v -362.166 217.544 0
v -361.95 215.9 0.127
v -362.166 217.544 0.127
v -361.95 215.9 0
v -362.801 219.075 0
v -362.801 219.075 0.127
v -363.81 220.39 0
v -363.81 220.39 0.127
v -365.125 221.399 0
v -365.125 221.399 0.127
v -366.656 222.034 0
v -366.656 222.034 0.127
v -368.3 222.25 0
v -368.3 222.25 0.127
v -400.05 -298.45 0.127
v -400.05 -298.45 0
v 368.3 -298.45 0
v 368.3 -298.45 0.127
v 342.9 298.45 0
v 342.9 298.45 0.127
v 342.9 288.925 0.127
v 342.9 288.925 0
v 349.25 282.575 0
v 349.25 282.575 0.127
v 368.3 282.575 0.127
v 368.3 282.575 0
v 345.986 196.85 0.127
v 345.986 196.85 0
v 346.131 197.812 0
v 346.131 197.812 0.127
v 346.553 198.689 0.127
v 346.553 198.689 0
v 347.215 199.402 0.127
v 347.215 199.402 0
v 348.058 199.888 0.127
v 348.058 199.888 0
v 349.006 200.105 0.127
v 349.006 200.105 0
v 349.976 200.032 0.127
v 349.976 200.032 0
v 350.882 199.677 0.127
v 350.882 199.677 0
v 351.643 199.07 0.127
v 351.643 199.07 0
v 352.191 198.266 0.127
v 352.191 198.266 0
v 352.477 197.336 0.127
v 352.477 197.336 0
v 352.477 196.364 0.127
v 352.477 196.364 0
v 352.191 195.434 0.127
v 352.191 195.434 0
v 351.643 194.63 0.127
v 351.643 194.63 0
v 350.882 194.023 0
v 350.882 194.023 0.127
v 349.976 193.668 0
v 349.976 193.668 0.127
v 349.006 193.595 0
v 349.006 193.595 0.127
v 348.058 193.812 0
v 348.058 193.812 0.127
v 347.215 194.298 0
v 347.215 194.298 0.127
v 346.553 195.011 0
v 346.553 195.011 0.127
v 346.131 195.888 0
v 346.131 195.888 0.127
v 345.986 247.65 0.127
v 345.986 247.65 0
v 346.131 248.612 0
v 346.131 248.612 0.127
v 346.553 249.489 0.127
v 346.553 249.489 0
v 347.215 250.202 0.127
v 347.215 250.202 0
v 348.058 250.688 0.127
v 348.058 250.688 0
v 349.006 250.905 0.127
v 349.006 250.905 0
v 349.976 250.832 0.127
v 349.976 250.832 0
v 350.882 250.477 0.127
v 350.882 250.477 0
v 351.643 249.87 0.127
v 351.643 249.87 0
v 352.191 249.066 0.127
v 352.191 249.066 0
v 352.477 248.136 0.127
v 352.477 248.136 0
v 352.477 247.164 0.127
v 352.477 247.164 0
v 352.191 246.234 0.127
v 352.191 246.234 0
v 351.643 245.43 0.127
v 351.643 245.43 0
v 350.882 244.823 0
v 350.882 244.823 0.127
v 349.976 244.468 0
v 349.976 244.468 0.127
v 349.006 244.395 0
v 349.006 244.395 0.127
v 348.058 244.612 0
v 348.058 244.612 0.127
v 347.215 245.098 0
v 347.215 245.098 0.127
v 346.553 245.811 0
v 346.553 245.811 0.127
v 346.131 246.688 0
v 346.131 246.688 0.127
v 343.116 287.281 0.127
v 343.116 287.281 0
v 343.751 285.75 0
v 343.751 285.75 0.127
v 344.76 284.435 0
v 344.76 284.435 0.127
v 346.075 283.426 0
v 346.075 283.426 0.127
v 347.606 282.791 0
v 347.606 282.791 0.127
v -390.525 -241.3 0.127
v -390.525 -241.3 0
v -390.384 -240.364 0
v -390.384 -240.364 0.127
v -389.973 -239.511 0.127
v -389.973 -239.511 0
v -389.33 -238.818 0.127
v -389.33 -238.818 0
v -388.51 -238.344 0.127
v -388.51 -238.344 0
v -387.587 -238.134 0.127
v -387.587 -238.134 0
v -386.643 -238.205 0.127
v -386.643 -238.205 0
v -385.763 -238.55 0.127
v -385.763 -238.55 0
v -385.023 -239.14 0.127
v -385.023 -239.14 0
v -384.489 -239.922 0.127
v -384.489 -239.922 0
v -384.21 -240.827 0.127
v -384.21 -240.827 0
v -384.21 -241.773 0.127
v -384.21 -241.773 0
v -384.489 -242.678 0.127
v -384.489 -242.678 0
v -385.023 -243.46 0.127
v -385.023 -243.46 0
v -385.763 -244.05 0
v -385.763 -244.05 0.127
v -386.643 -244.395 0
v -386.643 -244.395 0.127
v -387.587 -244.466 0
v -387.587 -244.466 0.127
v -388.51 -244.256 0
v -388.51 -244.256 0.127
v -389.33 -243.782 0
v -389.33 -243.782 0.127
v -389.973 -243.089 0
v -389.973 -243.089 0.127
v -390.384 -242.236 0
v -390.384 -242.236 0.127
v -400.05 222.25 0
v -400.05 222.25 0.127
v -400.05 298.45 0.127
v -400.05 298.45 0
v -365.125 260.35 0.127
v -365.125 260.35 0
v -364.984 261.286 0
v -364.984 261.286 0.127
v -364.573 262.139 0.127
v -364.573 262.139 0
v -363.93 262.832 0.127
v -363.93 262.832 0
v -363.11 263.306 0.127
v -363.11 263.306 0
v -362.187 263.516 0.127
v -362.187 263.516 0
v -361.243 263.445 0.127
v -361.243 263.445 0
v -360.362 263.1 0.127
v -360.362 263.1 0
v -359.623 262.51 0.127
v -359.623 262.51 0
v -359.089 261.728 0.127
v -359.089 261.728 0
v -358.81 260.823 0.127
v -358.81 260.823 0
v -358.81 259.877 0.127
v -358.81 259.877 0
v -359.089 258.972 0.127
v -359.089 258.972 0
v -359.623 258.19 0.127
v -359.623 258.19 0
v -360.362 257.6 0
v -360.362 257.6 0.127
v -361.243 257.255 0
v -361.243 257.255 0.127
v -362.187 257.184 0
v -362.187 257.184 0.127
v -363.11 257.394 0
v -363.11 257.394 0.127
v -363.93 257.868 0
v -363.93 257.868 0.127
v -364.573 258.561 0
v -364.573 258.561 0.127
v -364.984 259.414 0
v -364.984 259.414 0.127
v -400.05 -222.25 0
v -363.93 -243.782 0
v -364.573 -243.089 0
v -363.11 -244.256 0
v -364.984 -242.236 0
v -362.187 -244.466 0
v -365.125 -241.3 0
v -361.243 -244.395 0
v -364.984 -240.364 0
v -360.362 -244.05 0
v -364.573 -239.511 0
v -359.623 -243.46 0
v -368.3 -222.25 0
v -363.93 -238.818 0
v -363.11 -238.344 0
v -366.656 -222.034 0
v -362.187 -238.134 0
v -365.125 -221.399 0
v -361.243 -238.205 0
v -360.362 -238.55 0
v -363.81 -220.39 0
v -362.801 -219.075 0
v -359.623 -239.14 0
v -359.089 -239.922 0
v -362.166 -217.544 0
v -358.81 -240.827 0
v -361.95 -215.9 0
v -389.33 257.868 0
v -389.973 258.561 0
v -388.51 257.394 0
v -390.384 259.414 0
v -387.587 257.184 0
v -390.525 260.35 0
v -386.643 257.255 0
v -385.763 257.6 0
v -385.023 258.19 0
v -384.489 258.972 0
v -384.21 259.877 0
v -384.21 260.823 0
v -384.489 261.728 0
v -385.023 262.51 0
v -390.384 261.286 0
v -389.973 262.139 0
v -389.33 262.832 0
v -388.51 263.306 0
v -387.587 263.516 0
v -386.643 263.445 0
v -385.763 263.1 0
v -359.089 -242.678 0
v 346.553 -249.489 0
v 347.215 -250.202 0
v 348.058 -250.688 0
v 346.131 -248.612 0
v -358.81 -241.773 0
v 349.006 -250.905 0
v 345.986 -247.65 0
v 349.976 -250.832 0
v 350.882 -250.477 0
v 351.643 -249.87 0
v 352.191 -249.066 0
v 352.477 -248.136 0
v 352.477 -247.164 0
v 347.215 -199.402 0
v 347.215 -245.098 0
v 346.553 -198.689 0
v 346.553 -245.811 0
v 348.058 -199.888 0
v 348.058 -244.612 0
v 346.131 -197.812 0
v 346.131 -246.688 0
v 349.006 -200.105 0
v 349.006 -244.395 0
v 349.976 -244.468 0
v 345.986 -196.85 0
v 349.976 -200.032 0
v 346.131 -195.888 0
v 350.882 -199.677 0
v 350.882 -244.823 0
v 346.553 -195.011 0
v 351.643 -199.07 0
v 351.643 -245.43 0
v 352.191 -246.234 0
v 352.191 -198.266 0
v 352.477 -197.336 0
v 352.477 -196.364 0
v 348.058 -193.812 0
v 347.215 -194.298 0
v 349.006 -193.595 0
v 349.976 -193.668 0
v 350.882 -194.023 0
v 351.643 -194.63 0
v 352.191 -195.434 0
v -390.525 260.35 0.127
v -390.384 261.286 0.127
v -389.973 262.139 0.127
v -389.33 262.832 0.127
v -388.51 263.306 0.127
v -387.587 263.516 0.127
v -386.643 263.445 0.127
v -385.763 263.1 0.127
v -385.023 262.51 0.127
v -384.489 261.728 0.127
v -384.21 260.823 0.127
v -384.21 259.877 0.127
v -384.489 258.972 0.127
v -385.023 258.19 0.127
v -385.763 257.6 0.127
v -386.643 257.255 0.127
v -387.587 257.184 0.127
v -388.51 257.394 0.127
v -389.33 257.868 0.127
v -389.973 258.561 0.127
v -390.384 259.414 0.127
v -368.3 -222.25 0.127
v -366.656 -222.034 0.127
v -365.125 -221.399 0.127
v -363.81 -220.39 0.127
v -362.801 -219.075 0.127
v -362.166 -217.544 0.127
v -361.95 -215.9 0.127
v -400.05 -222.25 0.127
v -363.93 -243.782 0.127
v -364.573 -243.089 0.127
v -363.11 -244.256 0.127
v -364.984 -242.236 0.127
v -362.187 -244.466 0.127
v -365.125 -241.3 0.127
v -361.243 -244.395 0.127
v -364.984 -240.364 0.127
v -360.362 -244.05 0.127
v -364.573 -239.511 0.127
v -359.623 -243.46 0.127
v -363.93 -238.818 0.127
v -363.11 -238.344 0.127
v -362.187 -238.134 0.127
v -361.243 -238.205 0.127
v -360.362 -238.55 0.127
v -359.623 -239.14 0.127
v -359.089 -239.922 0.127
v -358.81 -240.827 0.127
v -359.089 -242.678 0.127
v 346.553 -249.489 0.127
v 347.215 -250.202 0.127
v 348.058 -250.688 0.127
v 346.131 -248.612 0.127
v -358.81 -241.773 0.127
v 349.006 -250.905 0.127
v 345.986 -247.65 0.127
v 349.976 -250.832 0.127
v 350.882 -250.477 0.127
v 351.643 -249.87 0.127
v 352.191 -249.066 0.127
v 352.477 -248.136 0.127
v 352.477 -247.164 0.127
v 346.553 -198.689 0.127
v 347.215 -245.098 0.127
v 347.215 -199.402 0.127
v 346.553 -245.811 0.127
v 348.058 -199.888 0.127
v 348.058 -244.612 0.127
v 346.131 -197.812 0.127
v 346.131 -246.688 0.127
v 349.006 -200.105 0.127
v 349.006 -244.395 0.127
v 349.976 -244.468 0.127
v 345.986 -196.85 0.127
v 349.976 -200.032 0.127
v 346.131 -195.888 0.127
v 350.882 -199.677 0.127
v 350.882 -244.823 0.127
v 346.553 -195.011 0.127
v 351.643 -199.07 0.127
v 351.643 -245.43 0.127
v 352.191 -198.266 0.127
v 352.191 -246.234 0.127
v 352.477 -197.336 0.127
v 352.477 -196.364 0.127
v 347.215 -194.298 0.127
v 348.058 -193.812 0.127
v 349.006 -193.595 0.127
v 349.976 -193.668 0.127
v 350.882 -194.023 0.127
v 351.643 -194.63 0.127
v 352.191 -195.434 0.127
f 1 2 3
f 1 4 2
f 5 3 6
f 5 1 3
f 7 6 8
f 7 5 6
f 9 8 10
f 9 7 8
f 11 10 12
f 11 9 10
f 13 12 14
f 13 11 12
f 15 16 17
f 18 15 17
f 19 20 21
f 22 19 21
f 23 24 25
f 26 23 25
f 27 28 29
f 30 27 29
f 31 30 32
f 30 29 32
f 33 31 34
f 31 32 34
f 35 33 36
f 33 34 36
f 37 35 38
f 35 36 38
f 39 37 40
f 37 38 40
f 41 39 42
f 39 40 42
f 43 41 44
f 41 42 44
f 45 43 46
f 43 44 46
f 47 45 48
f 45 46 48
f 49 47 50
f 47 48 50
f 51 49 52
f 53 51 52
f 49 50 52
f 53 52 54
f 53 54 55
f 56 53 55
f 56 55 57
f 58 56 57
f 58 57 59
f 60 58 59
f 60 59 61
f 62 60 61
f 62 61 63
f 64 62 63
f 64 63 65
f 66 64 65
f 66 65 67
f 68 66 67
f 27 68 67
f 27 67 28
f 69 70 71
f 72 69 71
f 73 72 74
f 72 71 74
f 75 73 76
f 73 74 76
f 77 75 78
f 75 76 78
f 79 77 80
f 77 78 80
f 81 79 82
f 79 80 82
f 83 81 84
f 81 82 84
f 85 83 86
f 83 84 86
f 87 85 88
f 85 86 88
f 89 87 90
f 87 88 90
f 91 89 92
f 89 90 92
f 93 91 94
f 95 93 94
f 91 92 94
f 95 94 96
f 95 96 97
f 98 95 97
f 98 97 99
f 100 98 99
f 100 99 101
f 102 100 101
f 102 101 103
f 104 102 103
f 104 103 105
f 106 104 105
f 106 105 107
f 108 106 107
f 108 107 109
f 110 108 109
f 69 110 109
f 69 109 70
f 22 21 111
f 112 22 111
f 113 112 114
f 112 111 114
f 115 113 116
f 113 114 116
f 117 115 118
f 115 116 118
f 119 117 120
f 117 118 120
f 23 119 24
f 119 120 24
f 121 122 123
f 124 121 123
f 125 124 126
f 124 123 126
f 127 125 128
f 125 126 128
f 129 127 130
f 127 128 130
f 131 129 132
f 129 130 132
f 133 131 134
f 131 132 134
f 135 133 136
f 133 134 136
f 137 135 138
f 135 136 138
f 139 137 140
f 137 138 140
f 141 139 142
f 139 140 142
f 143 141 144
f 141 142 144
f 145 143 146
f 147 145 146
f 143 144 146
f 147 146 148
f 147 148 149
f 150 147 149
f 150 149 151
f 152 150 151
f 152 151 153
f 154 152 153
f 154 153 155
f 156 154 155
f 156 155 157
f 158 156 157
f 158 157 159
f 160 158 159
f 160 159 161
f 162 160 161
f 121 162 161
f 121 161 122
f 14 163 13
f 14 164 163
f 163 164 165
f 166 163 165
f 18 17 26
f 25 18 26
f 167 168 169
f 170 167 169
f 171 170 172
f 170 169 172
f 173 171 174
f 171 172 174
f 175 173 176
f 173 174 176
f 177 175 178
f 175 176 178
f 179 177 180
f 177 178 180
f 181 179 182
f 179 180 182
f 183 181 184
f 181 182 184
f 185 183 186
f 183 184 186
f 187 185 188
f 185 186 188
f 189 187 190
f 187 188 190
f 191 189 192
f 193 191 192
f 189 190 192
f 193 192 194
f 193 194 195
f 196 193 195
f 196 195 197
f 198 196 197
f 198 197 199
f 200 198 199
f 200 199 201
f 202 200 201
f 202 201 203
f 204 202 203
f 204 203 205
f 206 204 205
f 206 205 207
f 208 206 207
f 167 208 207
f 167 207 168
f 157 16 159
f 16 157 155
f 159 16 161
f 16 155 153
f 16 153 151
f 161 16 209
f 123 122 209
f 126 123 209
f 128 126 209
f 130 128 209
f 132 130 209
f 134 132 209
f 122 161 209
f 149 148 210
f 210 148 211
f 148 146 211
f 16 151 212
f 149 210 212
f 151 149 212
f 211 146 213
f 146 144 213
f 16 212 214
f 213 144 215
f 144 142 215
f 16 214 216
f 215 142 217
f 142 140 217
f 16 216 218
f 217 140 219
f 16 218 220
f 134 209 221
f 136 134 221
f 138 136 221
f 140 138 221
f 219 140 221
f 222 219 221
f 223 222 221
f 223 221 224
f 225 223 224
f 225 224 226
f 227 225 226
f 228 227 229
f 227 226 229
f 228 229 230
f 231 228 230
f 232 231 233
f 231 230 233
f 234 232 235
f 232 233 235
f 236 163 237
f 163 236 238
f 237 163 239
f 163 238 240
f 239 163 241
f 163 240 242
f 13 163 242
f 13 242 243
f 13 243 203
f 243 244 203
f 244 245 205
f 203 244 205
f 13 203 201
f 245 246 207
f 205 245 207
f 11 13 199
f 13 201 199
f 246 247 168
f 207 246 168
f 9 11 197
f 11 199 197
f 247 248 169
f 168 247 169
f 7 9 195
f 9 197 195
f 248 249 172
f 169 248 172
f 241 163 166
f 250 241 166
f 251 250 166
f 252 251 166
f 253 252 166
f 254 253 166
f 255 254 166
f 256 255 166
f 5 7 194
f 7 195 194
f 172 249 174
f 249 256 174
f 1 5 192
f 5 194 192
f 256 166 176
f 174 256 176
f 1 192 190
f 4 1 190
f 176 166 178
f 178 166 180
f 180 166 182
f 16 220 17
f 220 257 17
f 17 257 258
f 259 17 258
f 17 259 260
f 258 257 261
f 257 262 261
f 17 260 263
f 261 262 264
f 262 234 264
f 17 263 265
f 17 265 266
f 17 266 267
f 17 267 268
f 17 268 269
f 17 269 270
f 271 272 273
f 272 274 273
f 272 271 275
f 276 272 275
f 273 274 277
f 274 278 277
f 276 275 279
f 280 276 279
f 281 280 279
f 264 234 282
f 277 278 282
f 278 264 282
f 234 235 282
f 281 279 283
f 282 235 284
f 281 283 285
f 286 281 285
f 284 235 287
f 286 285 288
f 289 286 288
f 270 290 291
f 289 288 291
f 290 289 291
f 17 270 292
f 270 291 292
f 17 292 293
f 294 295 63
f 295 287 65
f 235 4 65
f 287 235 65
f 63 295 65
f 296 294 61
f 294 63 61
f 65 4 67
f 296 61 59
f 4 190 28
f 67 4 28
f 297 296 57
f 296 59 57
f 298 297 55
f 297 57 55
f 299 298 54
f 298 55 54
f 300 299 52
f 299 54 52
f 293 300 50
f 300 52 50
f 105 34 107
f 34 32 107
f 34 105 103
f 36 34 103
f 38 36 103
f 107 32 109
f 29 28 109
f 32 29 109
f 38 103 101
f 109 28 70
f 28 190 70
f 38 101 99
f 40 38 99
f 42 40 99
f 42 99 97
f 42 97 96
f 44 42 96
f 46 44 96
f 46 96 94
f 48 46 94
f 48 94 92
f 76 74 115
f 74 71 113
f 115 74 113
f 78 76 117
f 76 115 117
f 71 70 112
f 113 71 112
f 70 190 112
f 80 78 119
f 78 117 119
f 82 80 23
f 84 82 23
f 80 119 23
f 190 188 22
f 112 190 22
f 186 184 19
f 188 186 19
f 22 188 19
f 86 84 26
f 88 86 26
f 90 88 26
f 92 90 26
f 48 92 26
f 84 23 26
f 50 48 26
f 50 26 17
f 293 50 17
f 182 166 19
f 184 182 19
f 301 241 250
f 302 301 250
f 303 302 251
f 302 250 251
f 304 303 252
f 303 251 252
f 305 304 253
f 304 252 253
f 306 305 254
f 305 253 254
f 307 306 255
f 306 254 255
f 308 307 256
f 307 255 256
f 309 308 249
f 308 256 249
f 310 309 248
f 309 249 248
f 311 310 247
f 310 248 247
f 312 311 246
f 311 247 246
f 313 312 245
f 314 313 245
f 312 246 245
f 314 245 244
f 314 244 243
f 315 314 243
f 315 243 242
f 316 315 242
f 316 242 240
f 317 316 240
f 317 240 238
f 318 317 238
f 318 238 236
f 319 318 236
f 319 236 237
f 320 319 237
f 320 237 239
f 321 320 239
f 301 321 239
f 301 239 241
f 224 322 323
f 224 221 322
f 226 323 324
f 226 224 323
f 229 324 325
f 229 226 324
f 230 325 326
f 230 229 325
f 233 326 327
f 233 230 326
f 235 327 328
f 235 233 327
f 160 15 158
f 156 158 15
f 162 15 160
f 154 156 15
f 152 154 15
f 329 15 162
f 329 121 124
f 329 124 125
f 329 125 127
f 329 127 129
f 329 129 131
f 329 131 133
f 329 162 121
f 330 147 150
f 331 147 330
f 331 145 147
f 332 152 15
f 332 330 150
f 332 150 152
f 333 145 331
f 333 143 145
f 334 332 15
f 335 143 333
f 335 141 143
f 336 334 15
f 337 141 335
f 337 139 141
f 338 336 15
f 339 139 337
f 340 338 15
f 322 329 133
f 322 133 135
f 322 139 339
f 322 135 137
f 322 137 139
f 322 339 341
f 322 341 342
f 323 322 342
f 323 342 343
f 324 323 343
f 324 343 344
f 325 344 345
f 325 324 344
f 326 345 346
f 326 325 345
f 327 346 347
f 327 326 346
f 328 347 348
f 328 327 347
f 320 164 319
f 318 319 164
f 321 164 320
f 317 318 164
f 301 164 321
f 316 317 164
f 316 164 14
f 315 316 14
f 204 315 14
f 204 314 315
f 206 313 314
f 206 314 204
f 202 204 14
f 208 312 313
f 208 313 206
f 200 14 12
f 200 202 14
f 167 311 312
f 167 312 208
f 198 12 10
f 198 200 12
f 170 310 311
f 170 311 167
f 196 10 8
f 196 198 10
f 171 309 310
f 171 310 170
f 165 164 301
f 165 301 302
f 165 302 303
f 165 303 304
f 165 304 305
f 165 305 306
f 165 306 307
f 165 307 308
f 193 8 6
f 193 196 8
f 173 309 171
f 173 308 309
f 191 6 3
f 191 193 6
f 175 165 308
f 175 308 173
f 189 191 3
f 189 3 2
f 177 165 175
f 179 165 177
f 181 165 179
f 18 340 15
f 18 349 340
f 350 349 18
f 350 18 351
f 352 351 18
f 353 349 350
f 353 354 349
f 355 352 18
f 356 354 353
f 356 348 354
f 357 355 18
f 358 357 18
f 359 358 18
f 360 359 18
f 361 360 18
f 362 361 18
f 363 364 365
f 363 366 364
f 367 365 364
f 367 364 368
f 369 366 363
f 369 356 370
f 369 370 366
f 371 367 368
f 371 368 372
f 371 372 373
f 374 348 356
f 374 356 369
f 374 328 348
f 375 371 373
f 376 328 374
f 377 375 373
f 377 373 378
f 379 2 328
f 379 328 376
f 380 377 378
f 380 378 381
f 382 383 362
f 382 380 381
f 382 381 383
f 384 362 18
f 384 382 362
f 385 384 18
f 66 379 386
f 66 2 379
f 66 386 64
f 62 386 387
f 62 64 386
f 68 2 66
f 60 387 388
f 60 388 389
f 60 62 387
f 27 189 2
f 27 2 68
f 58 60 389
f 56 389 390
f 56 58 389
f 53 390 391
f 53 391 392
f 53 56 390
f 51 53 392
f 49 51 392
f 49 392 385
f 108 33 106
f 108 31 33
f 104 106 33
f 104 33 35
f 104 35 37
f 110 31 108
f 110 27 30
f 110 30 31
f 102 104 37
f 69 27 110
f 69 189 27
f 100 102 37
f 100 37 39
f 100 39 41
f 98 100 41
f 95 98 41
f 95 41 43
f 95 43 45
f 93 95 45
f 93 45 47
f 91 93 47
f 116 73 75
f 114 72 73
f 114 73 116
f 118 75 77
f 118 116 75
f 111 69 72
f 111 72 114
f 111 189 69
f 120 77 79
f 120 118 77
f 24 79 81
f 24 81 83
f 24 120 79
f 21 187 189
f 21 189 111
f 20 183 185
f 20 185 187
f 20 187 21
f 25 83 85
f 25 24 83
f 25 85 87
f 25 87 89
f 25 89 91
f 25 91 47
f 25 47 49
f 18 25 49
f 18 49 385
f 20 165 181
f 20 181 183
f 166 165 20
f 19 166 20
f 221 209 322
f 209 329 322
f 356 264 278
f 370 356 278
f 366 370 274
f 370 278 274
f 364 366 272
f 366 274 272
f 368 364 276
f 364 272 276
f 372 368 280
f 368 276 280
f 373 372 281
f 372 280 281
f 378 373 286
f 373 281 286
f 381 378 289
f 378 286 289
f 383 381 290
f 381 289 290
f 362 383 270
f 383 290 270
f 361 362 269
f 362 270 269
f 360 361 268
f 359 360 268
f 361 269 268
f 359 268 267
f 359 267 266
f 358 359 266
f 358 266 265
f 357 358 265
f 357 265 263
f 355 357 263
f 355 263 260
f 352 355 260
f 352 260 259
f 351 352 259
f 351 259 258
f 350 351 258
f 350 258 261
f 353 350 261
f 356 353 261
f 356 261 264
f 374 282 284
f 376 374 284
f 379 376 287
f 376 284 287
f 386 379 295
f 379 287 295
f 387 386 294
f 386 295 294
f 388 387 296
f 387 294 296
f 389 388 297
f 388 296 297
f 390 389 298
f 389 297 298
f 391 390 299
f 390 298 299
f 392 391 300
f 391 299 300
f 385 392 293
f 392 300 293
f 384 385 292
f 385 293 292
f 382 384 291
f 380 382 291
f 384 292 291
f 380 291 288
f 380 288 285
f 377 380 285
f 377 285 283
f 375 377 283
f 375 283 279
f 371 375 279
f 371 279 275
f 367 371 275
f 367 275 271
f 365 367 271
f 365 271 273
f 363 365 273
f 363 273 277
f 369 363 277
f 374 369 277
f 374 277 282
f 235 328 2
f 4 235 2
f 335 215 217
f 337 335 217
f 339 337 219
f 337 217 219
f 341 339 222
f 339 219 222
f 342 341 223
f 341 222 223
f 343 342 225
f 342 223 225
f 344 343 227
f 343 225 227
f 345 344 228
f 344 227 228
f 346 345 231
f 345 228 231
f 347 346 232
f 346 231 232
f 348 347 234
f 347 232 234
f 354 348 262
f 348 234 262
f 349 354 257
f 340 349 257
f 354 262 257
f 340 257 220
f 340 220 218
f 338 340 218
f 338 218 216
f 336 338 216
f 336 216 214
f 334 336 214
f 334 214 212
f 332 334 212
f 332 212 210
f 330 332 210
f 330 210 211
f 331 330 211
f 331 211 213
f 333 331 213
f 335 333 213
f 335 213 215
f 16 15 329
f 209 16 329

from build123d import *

# Parameters (mm, degrees)
SKETCH1_W                   = 736.6
SKETCH1_H                   = 596.9
BOSS_EXTRUDE1_DEPTH         = 0.127
SKETCH5_W                   = 31.75
SKETCH5_H                   = 76.2
BOSS_EXTRUDE2_DEPTH         = 0.127
SKETCH6_W                   = 6.35
SKETCH6_H                   = 444.5
CUT_EXTRUDE1_DEPTH          = 1.127
FILLET1_R                   = 6.35
F_0_257_DIAMETER_HOLE1_D    = 6.5278
F_1_4_0_25_DIAMETER_HOLE2_D = 6.35
CUT_EXTRUDE2_DEPTH          = 1.127


with BuildPart() as part:
    # Sketch1 → Boss-Extrude1 (new body)
    with BuildSketch(Plane.XY):
        Rectangle(SKETCH1_W, SKETCH1_H)
    extrude(amount=BOSS_EXTRUDE1_DEPTH)

    # Sketch5 → Boss-Extrude2 (add)
    with BuildSketch(Plane.XY.offset(0.127)):
        with Locations((-384.175, 260.35)):
            Rectangle(SKETCH5_W, SKETCH5_H)
        with Locations((-384.175, -260.35)):
            Rectangle(SKETCH5_W, SKETCH5_H)
    extrude(amount=-BOSS_EXTRUDE2_DEPTH)

    # Sketch6 → Cut-Extrude1 (cut, through all)
    with BuildSketch(Plane.XY.offset(0.127)):
        with Locations((-365.125, 0)):
            Rectangle(SKETCH6_W, SKETCH6_H)
    extrude(amount=-CUT_EXTRUDE1_DEPTH, mode=Mode.SUBTRACT)

    # Fillet1
    fillet1_edges = [part.edges().sort_by_distance(p)[0] for p in [
        (-361.95, 222.25, 0.0635),
        (-361.95, -222.25, 0.0635),
    ]]
    fillet(fillet1_edges, radius=FILLET1_R)

    # F (0.257) Diameter Hole1 (through all)
    with Locations(Plane.XY.offset(0.127)):
        with Locations((349.25, 247.65), (349.25, 196.85), (349.25, -196.85), (349.25, -247.65)):
            Hole(F_0_257_DIAMETER_HOLE1_D / 2)

    # 1/4 (0.25) Diameter Hole2 (through all)
    with Locations(Plane.XY.offset(0.127)):
        with Locations((-387.35, 260.35), (-361.95, 260.35), (-361.95, -241.3), (-387.35, -241.3)):
            Hole(F_1_4_0_25_DIAMETER_HOLE2_D / 2)

    # Sketch13 → Cut-Extrude2 (cut, through all)
    with BuildSketch(Plane.XY.offset(0.127)):
        with BuildLine():
            Line((368.3, 298.45), (342.9, 298.45))
            Line((342.9, 298.45), (342.9, 288.925))
            ThreePointArc((342.9, 288.925), (344.759871939, 284.434871939), (349.25, 282.575))
            Line((349.25, 282.575), (368.3, 282.575))
            Line((368.3, 282.575), (368.3, 298.45))
        make_face()
    extrude(amount=-CUT_EXTRUDE2_DEPTH, mode=Mode.SUBTRACT)


solid = part.part
